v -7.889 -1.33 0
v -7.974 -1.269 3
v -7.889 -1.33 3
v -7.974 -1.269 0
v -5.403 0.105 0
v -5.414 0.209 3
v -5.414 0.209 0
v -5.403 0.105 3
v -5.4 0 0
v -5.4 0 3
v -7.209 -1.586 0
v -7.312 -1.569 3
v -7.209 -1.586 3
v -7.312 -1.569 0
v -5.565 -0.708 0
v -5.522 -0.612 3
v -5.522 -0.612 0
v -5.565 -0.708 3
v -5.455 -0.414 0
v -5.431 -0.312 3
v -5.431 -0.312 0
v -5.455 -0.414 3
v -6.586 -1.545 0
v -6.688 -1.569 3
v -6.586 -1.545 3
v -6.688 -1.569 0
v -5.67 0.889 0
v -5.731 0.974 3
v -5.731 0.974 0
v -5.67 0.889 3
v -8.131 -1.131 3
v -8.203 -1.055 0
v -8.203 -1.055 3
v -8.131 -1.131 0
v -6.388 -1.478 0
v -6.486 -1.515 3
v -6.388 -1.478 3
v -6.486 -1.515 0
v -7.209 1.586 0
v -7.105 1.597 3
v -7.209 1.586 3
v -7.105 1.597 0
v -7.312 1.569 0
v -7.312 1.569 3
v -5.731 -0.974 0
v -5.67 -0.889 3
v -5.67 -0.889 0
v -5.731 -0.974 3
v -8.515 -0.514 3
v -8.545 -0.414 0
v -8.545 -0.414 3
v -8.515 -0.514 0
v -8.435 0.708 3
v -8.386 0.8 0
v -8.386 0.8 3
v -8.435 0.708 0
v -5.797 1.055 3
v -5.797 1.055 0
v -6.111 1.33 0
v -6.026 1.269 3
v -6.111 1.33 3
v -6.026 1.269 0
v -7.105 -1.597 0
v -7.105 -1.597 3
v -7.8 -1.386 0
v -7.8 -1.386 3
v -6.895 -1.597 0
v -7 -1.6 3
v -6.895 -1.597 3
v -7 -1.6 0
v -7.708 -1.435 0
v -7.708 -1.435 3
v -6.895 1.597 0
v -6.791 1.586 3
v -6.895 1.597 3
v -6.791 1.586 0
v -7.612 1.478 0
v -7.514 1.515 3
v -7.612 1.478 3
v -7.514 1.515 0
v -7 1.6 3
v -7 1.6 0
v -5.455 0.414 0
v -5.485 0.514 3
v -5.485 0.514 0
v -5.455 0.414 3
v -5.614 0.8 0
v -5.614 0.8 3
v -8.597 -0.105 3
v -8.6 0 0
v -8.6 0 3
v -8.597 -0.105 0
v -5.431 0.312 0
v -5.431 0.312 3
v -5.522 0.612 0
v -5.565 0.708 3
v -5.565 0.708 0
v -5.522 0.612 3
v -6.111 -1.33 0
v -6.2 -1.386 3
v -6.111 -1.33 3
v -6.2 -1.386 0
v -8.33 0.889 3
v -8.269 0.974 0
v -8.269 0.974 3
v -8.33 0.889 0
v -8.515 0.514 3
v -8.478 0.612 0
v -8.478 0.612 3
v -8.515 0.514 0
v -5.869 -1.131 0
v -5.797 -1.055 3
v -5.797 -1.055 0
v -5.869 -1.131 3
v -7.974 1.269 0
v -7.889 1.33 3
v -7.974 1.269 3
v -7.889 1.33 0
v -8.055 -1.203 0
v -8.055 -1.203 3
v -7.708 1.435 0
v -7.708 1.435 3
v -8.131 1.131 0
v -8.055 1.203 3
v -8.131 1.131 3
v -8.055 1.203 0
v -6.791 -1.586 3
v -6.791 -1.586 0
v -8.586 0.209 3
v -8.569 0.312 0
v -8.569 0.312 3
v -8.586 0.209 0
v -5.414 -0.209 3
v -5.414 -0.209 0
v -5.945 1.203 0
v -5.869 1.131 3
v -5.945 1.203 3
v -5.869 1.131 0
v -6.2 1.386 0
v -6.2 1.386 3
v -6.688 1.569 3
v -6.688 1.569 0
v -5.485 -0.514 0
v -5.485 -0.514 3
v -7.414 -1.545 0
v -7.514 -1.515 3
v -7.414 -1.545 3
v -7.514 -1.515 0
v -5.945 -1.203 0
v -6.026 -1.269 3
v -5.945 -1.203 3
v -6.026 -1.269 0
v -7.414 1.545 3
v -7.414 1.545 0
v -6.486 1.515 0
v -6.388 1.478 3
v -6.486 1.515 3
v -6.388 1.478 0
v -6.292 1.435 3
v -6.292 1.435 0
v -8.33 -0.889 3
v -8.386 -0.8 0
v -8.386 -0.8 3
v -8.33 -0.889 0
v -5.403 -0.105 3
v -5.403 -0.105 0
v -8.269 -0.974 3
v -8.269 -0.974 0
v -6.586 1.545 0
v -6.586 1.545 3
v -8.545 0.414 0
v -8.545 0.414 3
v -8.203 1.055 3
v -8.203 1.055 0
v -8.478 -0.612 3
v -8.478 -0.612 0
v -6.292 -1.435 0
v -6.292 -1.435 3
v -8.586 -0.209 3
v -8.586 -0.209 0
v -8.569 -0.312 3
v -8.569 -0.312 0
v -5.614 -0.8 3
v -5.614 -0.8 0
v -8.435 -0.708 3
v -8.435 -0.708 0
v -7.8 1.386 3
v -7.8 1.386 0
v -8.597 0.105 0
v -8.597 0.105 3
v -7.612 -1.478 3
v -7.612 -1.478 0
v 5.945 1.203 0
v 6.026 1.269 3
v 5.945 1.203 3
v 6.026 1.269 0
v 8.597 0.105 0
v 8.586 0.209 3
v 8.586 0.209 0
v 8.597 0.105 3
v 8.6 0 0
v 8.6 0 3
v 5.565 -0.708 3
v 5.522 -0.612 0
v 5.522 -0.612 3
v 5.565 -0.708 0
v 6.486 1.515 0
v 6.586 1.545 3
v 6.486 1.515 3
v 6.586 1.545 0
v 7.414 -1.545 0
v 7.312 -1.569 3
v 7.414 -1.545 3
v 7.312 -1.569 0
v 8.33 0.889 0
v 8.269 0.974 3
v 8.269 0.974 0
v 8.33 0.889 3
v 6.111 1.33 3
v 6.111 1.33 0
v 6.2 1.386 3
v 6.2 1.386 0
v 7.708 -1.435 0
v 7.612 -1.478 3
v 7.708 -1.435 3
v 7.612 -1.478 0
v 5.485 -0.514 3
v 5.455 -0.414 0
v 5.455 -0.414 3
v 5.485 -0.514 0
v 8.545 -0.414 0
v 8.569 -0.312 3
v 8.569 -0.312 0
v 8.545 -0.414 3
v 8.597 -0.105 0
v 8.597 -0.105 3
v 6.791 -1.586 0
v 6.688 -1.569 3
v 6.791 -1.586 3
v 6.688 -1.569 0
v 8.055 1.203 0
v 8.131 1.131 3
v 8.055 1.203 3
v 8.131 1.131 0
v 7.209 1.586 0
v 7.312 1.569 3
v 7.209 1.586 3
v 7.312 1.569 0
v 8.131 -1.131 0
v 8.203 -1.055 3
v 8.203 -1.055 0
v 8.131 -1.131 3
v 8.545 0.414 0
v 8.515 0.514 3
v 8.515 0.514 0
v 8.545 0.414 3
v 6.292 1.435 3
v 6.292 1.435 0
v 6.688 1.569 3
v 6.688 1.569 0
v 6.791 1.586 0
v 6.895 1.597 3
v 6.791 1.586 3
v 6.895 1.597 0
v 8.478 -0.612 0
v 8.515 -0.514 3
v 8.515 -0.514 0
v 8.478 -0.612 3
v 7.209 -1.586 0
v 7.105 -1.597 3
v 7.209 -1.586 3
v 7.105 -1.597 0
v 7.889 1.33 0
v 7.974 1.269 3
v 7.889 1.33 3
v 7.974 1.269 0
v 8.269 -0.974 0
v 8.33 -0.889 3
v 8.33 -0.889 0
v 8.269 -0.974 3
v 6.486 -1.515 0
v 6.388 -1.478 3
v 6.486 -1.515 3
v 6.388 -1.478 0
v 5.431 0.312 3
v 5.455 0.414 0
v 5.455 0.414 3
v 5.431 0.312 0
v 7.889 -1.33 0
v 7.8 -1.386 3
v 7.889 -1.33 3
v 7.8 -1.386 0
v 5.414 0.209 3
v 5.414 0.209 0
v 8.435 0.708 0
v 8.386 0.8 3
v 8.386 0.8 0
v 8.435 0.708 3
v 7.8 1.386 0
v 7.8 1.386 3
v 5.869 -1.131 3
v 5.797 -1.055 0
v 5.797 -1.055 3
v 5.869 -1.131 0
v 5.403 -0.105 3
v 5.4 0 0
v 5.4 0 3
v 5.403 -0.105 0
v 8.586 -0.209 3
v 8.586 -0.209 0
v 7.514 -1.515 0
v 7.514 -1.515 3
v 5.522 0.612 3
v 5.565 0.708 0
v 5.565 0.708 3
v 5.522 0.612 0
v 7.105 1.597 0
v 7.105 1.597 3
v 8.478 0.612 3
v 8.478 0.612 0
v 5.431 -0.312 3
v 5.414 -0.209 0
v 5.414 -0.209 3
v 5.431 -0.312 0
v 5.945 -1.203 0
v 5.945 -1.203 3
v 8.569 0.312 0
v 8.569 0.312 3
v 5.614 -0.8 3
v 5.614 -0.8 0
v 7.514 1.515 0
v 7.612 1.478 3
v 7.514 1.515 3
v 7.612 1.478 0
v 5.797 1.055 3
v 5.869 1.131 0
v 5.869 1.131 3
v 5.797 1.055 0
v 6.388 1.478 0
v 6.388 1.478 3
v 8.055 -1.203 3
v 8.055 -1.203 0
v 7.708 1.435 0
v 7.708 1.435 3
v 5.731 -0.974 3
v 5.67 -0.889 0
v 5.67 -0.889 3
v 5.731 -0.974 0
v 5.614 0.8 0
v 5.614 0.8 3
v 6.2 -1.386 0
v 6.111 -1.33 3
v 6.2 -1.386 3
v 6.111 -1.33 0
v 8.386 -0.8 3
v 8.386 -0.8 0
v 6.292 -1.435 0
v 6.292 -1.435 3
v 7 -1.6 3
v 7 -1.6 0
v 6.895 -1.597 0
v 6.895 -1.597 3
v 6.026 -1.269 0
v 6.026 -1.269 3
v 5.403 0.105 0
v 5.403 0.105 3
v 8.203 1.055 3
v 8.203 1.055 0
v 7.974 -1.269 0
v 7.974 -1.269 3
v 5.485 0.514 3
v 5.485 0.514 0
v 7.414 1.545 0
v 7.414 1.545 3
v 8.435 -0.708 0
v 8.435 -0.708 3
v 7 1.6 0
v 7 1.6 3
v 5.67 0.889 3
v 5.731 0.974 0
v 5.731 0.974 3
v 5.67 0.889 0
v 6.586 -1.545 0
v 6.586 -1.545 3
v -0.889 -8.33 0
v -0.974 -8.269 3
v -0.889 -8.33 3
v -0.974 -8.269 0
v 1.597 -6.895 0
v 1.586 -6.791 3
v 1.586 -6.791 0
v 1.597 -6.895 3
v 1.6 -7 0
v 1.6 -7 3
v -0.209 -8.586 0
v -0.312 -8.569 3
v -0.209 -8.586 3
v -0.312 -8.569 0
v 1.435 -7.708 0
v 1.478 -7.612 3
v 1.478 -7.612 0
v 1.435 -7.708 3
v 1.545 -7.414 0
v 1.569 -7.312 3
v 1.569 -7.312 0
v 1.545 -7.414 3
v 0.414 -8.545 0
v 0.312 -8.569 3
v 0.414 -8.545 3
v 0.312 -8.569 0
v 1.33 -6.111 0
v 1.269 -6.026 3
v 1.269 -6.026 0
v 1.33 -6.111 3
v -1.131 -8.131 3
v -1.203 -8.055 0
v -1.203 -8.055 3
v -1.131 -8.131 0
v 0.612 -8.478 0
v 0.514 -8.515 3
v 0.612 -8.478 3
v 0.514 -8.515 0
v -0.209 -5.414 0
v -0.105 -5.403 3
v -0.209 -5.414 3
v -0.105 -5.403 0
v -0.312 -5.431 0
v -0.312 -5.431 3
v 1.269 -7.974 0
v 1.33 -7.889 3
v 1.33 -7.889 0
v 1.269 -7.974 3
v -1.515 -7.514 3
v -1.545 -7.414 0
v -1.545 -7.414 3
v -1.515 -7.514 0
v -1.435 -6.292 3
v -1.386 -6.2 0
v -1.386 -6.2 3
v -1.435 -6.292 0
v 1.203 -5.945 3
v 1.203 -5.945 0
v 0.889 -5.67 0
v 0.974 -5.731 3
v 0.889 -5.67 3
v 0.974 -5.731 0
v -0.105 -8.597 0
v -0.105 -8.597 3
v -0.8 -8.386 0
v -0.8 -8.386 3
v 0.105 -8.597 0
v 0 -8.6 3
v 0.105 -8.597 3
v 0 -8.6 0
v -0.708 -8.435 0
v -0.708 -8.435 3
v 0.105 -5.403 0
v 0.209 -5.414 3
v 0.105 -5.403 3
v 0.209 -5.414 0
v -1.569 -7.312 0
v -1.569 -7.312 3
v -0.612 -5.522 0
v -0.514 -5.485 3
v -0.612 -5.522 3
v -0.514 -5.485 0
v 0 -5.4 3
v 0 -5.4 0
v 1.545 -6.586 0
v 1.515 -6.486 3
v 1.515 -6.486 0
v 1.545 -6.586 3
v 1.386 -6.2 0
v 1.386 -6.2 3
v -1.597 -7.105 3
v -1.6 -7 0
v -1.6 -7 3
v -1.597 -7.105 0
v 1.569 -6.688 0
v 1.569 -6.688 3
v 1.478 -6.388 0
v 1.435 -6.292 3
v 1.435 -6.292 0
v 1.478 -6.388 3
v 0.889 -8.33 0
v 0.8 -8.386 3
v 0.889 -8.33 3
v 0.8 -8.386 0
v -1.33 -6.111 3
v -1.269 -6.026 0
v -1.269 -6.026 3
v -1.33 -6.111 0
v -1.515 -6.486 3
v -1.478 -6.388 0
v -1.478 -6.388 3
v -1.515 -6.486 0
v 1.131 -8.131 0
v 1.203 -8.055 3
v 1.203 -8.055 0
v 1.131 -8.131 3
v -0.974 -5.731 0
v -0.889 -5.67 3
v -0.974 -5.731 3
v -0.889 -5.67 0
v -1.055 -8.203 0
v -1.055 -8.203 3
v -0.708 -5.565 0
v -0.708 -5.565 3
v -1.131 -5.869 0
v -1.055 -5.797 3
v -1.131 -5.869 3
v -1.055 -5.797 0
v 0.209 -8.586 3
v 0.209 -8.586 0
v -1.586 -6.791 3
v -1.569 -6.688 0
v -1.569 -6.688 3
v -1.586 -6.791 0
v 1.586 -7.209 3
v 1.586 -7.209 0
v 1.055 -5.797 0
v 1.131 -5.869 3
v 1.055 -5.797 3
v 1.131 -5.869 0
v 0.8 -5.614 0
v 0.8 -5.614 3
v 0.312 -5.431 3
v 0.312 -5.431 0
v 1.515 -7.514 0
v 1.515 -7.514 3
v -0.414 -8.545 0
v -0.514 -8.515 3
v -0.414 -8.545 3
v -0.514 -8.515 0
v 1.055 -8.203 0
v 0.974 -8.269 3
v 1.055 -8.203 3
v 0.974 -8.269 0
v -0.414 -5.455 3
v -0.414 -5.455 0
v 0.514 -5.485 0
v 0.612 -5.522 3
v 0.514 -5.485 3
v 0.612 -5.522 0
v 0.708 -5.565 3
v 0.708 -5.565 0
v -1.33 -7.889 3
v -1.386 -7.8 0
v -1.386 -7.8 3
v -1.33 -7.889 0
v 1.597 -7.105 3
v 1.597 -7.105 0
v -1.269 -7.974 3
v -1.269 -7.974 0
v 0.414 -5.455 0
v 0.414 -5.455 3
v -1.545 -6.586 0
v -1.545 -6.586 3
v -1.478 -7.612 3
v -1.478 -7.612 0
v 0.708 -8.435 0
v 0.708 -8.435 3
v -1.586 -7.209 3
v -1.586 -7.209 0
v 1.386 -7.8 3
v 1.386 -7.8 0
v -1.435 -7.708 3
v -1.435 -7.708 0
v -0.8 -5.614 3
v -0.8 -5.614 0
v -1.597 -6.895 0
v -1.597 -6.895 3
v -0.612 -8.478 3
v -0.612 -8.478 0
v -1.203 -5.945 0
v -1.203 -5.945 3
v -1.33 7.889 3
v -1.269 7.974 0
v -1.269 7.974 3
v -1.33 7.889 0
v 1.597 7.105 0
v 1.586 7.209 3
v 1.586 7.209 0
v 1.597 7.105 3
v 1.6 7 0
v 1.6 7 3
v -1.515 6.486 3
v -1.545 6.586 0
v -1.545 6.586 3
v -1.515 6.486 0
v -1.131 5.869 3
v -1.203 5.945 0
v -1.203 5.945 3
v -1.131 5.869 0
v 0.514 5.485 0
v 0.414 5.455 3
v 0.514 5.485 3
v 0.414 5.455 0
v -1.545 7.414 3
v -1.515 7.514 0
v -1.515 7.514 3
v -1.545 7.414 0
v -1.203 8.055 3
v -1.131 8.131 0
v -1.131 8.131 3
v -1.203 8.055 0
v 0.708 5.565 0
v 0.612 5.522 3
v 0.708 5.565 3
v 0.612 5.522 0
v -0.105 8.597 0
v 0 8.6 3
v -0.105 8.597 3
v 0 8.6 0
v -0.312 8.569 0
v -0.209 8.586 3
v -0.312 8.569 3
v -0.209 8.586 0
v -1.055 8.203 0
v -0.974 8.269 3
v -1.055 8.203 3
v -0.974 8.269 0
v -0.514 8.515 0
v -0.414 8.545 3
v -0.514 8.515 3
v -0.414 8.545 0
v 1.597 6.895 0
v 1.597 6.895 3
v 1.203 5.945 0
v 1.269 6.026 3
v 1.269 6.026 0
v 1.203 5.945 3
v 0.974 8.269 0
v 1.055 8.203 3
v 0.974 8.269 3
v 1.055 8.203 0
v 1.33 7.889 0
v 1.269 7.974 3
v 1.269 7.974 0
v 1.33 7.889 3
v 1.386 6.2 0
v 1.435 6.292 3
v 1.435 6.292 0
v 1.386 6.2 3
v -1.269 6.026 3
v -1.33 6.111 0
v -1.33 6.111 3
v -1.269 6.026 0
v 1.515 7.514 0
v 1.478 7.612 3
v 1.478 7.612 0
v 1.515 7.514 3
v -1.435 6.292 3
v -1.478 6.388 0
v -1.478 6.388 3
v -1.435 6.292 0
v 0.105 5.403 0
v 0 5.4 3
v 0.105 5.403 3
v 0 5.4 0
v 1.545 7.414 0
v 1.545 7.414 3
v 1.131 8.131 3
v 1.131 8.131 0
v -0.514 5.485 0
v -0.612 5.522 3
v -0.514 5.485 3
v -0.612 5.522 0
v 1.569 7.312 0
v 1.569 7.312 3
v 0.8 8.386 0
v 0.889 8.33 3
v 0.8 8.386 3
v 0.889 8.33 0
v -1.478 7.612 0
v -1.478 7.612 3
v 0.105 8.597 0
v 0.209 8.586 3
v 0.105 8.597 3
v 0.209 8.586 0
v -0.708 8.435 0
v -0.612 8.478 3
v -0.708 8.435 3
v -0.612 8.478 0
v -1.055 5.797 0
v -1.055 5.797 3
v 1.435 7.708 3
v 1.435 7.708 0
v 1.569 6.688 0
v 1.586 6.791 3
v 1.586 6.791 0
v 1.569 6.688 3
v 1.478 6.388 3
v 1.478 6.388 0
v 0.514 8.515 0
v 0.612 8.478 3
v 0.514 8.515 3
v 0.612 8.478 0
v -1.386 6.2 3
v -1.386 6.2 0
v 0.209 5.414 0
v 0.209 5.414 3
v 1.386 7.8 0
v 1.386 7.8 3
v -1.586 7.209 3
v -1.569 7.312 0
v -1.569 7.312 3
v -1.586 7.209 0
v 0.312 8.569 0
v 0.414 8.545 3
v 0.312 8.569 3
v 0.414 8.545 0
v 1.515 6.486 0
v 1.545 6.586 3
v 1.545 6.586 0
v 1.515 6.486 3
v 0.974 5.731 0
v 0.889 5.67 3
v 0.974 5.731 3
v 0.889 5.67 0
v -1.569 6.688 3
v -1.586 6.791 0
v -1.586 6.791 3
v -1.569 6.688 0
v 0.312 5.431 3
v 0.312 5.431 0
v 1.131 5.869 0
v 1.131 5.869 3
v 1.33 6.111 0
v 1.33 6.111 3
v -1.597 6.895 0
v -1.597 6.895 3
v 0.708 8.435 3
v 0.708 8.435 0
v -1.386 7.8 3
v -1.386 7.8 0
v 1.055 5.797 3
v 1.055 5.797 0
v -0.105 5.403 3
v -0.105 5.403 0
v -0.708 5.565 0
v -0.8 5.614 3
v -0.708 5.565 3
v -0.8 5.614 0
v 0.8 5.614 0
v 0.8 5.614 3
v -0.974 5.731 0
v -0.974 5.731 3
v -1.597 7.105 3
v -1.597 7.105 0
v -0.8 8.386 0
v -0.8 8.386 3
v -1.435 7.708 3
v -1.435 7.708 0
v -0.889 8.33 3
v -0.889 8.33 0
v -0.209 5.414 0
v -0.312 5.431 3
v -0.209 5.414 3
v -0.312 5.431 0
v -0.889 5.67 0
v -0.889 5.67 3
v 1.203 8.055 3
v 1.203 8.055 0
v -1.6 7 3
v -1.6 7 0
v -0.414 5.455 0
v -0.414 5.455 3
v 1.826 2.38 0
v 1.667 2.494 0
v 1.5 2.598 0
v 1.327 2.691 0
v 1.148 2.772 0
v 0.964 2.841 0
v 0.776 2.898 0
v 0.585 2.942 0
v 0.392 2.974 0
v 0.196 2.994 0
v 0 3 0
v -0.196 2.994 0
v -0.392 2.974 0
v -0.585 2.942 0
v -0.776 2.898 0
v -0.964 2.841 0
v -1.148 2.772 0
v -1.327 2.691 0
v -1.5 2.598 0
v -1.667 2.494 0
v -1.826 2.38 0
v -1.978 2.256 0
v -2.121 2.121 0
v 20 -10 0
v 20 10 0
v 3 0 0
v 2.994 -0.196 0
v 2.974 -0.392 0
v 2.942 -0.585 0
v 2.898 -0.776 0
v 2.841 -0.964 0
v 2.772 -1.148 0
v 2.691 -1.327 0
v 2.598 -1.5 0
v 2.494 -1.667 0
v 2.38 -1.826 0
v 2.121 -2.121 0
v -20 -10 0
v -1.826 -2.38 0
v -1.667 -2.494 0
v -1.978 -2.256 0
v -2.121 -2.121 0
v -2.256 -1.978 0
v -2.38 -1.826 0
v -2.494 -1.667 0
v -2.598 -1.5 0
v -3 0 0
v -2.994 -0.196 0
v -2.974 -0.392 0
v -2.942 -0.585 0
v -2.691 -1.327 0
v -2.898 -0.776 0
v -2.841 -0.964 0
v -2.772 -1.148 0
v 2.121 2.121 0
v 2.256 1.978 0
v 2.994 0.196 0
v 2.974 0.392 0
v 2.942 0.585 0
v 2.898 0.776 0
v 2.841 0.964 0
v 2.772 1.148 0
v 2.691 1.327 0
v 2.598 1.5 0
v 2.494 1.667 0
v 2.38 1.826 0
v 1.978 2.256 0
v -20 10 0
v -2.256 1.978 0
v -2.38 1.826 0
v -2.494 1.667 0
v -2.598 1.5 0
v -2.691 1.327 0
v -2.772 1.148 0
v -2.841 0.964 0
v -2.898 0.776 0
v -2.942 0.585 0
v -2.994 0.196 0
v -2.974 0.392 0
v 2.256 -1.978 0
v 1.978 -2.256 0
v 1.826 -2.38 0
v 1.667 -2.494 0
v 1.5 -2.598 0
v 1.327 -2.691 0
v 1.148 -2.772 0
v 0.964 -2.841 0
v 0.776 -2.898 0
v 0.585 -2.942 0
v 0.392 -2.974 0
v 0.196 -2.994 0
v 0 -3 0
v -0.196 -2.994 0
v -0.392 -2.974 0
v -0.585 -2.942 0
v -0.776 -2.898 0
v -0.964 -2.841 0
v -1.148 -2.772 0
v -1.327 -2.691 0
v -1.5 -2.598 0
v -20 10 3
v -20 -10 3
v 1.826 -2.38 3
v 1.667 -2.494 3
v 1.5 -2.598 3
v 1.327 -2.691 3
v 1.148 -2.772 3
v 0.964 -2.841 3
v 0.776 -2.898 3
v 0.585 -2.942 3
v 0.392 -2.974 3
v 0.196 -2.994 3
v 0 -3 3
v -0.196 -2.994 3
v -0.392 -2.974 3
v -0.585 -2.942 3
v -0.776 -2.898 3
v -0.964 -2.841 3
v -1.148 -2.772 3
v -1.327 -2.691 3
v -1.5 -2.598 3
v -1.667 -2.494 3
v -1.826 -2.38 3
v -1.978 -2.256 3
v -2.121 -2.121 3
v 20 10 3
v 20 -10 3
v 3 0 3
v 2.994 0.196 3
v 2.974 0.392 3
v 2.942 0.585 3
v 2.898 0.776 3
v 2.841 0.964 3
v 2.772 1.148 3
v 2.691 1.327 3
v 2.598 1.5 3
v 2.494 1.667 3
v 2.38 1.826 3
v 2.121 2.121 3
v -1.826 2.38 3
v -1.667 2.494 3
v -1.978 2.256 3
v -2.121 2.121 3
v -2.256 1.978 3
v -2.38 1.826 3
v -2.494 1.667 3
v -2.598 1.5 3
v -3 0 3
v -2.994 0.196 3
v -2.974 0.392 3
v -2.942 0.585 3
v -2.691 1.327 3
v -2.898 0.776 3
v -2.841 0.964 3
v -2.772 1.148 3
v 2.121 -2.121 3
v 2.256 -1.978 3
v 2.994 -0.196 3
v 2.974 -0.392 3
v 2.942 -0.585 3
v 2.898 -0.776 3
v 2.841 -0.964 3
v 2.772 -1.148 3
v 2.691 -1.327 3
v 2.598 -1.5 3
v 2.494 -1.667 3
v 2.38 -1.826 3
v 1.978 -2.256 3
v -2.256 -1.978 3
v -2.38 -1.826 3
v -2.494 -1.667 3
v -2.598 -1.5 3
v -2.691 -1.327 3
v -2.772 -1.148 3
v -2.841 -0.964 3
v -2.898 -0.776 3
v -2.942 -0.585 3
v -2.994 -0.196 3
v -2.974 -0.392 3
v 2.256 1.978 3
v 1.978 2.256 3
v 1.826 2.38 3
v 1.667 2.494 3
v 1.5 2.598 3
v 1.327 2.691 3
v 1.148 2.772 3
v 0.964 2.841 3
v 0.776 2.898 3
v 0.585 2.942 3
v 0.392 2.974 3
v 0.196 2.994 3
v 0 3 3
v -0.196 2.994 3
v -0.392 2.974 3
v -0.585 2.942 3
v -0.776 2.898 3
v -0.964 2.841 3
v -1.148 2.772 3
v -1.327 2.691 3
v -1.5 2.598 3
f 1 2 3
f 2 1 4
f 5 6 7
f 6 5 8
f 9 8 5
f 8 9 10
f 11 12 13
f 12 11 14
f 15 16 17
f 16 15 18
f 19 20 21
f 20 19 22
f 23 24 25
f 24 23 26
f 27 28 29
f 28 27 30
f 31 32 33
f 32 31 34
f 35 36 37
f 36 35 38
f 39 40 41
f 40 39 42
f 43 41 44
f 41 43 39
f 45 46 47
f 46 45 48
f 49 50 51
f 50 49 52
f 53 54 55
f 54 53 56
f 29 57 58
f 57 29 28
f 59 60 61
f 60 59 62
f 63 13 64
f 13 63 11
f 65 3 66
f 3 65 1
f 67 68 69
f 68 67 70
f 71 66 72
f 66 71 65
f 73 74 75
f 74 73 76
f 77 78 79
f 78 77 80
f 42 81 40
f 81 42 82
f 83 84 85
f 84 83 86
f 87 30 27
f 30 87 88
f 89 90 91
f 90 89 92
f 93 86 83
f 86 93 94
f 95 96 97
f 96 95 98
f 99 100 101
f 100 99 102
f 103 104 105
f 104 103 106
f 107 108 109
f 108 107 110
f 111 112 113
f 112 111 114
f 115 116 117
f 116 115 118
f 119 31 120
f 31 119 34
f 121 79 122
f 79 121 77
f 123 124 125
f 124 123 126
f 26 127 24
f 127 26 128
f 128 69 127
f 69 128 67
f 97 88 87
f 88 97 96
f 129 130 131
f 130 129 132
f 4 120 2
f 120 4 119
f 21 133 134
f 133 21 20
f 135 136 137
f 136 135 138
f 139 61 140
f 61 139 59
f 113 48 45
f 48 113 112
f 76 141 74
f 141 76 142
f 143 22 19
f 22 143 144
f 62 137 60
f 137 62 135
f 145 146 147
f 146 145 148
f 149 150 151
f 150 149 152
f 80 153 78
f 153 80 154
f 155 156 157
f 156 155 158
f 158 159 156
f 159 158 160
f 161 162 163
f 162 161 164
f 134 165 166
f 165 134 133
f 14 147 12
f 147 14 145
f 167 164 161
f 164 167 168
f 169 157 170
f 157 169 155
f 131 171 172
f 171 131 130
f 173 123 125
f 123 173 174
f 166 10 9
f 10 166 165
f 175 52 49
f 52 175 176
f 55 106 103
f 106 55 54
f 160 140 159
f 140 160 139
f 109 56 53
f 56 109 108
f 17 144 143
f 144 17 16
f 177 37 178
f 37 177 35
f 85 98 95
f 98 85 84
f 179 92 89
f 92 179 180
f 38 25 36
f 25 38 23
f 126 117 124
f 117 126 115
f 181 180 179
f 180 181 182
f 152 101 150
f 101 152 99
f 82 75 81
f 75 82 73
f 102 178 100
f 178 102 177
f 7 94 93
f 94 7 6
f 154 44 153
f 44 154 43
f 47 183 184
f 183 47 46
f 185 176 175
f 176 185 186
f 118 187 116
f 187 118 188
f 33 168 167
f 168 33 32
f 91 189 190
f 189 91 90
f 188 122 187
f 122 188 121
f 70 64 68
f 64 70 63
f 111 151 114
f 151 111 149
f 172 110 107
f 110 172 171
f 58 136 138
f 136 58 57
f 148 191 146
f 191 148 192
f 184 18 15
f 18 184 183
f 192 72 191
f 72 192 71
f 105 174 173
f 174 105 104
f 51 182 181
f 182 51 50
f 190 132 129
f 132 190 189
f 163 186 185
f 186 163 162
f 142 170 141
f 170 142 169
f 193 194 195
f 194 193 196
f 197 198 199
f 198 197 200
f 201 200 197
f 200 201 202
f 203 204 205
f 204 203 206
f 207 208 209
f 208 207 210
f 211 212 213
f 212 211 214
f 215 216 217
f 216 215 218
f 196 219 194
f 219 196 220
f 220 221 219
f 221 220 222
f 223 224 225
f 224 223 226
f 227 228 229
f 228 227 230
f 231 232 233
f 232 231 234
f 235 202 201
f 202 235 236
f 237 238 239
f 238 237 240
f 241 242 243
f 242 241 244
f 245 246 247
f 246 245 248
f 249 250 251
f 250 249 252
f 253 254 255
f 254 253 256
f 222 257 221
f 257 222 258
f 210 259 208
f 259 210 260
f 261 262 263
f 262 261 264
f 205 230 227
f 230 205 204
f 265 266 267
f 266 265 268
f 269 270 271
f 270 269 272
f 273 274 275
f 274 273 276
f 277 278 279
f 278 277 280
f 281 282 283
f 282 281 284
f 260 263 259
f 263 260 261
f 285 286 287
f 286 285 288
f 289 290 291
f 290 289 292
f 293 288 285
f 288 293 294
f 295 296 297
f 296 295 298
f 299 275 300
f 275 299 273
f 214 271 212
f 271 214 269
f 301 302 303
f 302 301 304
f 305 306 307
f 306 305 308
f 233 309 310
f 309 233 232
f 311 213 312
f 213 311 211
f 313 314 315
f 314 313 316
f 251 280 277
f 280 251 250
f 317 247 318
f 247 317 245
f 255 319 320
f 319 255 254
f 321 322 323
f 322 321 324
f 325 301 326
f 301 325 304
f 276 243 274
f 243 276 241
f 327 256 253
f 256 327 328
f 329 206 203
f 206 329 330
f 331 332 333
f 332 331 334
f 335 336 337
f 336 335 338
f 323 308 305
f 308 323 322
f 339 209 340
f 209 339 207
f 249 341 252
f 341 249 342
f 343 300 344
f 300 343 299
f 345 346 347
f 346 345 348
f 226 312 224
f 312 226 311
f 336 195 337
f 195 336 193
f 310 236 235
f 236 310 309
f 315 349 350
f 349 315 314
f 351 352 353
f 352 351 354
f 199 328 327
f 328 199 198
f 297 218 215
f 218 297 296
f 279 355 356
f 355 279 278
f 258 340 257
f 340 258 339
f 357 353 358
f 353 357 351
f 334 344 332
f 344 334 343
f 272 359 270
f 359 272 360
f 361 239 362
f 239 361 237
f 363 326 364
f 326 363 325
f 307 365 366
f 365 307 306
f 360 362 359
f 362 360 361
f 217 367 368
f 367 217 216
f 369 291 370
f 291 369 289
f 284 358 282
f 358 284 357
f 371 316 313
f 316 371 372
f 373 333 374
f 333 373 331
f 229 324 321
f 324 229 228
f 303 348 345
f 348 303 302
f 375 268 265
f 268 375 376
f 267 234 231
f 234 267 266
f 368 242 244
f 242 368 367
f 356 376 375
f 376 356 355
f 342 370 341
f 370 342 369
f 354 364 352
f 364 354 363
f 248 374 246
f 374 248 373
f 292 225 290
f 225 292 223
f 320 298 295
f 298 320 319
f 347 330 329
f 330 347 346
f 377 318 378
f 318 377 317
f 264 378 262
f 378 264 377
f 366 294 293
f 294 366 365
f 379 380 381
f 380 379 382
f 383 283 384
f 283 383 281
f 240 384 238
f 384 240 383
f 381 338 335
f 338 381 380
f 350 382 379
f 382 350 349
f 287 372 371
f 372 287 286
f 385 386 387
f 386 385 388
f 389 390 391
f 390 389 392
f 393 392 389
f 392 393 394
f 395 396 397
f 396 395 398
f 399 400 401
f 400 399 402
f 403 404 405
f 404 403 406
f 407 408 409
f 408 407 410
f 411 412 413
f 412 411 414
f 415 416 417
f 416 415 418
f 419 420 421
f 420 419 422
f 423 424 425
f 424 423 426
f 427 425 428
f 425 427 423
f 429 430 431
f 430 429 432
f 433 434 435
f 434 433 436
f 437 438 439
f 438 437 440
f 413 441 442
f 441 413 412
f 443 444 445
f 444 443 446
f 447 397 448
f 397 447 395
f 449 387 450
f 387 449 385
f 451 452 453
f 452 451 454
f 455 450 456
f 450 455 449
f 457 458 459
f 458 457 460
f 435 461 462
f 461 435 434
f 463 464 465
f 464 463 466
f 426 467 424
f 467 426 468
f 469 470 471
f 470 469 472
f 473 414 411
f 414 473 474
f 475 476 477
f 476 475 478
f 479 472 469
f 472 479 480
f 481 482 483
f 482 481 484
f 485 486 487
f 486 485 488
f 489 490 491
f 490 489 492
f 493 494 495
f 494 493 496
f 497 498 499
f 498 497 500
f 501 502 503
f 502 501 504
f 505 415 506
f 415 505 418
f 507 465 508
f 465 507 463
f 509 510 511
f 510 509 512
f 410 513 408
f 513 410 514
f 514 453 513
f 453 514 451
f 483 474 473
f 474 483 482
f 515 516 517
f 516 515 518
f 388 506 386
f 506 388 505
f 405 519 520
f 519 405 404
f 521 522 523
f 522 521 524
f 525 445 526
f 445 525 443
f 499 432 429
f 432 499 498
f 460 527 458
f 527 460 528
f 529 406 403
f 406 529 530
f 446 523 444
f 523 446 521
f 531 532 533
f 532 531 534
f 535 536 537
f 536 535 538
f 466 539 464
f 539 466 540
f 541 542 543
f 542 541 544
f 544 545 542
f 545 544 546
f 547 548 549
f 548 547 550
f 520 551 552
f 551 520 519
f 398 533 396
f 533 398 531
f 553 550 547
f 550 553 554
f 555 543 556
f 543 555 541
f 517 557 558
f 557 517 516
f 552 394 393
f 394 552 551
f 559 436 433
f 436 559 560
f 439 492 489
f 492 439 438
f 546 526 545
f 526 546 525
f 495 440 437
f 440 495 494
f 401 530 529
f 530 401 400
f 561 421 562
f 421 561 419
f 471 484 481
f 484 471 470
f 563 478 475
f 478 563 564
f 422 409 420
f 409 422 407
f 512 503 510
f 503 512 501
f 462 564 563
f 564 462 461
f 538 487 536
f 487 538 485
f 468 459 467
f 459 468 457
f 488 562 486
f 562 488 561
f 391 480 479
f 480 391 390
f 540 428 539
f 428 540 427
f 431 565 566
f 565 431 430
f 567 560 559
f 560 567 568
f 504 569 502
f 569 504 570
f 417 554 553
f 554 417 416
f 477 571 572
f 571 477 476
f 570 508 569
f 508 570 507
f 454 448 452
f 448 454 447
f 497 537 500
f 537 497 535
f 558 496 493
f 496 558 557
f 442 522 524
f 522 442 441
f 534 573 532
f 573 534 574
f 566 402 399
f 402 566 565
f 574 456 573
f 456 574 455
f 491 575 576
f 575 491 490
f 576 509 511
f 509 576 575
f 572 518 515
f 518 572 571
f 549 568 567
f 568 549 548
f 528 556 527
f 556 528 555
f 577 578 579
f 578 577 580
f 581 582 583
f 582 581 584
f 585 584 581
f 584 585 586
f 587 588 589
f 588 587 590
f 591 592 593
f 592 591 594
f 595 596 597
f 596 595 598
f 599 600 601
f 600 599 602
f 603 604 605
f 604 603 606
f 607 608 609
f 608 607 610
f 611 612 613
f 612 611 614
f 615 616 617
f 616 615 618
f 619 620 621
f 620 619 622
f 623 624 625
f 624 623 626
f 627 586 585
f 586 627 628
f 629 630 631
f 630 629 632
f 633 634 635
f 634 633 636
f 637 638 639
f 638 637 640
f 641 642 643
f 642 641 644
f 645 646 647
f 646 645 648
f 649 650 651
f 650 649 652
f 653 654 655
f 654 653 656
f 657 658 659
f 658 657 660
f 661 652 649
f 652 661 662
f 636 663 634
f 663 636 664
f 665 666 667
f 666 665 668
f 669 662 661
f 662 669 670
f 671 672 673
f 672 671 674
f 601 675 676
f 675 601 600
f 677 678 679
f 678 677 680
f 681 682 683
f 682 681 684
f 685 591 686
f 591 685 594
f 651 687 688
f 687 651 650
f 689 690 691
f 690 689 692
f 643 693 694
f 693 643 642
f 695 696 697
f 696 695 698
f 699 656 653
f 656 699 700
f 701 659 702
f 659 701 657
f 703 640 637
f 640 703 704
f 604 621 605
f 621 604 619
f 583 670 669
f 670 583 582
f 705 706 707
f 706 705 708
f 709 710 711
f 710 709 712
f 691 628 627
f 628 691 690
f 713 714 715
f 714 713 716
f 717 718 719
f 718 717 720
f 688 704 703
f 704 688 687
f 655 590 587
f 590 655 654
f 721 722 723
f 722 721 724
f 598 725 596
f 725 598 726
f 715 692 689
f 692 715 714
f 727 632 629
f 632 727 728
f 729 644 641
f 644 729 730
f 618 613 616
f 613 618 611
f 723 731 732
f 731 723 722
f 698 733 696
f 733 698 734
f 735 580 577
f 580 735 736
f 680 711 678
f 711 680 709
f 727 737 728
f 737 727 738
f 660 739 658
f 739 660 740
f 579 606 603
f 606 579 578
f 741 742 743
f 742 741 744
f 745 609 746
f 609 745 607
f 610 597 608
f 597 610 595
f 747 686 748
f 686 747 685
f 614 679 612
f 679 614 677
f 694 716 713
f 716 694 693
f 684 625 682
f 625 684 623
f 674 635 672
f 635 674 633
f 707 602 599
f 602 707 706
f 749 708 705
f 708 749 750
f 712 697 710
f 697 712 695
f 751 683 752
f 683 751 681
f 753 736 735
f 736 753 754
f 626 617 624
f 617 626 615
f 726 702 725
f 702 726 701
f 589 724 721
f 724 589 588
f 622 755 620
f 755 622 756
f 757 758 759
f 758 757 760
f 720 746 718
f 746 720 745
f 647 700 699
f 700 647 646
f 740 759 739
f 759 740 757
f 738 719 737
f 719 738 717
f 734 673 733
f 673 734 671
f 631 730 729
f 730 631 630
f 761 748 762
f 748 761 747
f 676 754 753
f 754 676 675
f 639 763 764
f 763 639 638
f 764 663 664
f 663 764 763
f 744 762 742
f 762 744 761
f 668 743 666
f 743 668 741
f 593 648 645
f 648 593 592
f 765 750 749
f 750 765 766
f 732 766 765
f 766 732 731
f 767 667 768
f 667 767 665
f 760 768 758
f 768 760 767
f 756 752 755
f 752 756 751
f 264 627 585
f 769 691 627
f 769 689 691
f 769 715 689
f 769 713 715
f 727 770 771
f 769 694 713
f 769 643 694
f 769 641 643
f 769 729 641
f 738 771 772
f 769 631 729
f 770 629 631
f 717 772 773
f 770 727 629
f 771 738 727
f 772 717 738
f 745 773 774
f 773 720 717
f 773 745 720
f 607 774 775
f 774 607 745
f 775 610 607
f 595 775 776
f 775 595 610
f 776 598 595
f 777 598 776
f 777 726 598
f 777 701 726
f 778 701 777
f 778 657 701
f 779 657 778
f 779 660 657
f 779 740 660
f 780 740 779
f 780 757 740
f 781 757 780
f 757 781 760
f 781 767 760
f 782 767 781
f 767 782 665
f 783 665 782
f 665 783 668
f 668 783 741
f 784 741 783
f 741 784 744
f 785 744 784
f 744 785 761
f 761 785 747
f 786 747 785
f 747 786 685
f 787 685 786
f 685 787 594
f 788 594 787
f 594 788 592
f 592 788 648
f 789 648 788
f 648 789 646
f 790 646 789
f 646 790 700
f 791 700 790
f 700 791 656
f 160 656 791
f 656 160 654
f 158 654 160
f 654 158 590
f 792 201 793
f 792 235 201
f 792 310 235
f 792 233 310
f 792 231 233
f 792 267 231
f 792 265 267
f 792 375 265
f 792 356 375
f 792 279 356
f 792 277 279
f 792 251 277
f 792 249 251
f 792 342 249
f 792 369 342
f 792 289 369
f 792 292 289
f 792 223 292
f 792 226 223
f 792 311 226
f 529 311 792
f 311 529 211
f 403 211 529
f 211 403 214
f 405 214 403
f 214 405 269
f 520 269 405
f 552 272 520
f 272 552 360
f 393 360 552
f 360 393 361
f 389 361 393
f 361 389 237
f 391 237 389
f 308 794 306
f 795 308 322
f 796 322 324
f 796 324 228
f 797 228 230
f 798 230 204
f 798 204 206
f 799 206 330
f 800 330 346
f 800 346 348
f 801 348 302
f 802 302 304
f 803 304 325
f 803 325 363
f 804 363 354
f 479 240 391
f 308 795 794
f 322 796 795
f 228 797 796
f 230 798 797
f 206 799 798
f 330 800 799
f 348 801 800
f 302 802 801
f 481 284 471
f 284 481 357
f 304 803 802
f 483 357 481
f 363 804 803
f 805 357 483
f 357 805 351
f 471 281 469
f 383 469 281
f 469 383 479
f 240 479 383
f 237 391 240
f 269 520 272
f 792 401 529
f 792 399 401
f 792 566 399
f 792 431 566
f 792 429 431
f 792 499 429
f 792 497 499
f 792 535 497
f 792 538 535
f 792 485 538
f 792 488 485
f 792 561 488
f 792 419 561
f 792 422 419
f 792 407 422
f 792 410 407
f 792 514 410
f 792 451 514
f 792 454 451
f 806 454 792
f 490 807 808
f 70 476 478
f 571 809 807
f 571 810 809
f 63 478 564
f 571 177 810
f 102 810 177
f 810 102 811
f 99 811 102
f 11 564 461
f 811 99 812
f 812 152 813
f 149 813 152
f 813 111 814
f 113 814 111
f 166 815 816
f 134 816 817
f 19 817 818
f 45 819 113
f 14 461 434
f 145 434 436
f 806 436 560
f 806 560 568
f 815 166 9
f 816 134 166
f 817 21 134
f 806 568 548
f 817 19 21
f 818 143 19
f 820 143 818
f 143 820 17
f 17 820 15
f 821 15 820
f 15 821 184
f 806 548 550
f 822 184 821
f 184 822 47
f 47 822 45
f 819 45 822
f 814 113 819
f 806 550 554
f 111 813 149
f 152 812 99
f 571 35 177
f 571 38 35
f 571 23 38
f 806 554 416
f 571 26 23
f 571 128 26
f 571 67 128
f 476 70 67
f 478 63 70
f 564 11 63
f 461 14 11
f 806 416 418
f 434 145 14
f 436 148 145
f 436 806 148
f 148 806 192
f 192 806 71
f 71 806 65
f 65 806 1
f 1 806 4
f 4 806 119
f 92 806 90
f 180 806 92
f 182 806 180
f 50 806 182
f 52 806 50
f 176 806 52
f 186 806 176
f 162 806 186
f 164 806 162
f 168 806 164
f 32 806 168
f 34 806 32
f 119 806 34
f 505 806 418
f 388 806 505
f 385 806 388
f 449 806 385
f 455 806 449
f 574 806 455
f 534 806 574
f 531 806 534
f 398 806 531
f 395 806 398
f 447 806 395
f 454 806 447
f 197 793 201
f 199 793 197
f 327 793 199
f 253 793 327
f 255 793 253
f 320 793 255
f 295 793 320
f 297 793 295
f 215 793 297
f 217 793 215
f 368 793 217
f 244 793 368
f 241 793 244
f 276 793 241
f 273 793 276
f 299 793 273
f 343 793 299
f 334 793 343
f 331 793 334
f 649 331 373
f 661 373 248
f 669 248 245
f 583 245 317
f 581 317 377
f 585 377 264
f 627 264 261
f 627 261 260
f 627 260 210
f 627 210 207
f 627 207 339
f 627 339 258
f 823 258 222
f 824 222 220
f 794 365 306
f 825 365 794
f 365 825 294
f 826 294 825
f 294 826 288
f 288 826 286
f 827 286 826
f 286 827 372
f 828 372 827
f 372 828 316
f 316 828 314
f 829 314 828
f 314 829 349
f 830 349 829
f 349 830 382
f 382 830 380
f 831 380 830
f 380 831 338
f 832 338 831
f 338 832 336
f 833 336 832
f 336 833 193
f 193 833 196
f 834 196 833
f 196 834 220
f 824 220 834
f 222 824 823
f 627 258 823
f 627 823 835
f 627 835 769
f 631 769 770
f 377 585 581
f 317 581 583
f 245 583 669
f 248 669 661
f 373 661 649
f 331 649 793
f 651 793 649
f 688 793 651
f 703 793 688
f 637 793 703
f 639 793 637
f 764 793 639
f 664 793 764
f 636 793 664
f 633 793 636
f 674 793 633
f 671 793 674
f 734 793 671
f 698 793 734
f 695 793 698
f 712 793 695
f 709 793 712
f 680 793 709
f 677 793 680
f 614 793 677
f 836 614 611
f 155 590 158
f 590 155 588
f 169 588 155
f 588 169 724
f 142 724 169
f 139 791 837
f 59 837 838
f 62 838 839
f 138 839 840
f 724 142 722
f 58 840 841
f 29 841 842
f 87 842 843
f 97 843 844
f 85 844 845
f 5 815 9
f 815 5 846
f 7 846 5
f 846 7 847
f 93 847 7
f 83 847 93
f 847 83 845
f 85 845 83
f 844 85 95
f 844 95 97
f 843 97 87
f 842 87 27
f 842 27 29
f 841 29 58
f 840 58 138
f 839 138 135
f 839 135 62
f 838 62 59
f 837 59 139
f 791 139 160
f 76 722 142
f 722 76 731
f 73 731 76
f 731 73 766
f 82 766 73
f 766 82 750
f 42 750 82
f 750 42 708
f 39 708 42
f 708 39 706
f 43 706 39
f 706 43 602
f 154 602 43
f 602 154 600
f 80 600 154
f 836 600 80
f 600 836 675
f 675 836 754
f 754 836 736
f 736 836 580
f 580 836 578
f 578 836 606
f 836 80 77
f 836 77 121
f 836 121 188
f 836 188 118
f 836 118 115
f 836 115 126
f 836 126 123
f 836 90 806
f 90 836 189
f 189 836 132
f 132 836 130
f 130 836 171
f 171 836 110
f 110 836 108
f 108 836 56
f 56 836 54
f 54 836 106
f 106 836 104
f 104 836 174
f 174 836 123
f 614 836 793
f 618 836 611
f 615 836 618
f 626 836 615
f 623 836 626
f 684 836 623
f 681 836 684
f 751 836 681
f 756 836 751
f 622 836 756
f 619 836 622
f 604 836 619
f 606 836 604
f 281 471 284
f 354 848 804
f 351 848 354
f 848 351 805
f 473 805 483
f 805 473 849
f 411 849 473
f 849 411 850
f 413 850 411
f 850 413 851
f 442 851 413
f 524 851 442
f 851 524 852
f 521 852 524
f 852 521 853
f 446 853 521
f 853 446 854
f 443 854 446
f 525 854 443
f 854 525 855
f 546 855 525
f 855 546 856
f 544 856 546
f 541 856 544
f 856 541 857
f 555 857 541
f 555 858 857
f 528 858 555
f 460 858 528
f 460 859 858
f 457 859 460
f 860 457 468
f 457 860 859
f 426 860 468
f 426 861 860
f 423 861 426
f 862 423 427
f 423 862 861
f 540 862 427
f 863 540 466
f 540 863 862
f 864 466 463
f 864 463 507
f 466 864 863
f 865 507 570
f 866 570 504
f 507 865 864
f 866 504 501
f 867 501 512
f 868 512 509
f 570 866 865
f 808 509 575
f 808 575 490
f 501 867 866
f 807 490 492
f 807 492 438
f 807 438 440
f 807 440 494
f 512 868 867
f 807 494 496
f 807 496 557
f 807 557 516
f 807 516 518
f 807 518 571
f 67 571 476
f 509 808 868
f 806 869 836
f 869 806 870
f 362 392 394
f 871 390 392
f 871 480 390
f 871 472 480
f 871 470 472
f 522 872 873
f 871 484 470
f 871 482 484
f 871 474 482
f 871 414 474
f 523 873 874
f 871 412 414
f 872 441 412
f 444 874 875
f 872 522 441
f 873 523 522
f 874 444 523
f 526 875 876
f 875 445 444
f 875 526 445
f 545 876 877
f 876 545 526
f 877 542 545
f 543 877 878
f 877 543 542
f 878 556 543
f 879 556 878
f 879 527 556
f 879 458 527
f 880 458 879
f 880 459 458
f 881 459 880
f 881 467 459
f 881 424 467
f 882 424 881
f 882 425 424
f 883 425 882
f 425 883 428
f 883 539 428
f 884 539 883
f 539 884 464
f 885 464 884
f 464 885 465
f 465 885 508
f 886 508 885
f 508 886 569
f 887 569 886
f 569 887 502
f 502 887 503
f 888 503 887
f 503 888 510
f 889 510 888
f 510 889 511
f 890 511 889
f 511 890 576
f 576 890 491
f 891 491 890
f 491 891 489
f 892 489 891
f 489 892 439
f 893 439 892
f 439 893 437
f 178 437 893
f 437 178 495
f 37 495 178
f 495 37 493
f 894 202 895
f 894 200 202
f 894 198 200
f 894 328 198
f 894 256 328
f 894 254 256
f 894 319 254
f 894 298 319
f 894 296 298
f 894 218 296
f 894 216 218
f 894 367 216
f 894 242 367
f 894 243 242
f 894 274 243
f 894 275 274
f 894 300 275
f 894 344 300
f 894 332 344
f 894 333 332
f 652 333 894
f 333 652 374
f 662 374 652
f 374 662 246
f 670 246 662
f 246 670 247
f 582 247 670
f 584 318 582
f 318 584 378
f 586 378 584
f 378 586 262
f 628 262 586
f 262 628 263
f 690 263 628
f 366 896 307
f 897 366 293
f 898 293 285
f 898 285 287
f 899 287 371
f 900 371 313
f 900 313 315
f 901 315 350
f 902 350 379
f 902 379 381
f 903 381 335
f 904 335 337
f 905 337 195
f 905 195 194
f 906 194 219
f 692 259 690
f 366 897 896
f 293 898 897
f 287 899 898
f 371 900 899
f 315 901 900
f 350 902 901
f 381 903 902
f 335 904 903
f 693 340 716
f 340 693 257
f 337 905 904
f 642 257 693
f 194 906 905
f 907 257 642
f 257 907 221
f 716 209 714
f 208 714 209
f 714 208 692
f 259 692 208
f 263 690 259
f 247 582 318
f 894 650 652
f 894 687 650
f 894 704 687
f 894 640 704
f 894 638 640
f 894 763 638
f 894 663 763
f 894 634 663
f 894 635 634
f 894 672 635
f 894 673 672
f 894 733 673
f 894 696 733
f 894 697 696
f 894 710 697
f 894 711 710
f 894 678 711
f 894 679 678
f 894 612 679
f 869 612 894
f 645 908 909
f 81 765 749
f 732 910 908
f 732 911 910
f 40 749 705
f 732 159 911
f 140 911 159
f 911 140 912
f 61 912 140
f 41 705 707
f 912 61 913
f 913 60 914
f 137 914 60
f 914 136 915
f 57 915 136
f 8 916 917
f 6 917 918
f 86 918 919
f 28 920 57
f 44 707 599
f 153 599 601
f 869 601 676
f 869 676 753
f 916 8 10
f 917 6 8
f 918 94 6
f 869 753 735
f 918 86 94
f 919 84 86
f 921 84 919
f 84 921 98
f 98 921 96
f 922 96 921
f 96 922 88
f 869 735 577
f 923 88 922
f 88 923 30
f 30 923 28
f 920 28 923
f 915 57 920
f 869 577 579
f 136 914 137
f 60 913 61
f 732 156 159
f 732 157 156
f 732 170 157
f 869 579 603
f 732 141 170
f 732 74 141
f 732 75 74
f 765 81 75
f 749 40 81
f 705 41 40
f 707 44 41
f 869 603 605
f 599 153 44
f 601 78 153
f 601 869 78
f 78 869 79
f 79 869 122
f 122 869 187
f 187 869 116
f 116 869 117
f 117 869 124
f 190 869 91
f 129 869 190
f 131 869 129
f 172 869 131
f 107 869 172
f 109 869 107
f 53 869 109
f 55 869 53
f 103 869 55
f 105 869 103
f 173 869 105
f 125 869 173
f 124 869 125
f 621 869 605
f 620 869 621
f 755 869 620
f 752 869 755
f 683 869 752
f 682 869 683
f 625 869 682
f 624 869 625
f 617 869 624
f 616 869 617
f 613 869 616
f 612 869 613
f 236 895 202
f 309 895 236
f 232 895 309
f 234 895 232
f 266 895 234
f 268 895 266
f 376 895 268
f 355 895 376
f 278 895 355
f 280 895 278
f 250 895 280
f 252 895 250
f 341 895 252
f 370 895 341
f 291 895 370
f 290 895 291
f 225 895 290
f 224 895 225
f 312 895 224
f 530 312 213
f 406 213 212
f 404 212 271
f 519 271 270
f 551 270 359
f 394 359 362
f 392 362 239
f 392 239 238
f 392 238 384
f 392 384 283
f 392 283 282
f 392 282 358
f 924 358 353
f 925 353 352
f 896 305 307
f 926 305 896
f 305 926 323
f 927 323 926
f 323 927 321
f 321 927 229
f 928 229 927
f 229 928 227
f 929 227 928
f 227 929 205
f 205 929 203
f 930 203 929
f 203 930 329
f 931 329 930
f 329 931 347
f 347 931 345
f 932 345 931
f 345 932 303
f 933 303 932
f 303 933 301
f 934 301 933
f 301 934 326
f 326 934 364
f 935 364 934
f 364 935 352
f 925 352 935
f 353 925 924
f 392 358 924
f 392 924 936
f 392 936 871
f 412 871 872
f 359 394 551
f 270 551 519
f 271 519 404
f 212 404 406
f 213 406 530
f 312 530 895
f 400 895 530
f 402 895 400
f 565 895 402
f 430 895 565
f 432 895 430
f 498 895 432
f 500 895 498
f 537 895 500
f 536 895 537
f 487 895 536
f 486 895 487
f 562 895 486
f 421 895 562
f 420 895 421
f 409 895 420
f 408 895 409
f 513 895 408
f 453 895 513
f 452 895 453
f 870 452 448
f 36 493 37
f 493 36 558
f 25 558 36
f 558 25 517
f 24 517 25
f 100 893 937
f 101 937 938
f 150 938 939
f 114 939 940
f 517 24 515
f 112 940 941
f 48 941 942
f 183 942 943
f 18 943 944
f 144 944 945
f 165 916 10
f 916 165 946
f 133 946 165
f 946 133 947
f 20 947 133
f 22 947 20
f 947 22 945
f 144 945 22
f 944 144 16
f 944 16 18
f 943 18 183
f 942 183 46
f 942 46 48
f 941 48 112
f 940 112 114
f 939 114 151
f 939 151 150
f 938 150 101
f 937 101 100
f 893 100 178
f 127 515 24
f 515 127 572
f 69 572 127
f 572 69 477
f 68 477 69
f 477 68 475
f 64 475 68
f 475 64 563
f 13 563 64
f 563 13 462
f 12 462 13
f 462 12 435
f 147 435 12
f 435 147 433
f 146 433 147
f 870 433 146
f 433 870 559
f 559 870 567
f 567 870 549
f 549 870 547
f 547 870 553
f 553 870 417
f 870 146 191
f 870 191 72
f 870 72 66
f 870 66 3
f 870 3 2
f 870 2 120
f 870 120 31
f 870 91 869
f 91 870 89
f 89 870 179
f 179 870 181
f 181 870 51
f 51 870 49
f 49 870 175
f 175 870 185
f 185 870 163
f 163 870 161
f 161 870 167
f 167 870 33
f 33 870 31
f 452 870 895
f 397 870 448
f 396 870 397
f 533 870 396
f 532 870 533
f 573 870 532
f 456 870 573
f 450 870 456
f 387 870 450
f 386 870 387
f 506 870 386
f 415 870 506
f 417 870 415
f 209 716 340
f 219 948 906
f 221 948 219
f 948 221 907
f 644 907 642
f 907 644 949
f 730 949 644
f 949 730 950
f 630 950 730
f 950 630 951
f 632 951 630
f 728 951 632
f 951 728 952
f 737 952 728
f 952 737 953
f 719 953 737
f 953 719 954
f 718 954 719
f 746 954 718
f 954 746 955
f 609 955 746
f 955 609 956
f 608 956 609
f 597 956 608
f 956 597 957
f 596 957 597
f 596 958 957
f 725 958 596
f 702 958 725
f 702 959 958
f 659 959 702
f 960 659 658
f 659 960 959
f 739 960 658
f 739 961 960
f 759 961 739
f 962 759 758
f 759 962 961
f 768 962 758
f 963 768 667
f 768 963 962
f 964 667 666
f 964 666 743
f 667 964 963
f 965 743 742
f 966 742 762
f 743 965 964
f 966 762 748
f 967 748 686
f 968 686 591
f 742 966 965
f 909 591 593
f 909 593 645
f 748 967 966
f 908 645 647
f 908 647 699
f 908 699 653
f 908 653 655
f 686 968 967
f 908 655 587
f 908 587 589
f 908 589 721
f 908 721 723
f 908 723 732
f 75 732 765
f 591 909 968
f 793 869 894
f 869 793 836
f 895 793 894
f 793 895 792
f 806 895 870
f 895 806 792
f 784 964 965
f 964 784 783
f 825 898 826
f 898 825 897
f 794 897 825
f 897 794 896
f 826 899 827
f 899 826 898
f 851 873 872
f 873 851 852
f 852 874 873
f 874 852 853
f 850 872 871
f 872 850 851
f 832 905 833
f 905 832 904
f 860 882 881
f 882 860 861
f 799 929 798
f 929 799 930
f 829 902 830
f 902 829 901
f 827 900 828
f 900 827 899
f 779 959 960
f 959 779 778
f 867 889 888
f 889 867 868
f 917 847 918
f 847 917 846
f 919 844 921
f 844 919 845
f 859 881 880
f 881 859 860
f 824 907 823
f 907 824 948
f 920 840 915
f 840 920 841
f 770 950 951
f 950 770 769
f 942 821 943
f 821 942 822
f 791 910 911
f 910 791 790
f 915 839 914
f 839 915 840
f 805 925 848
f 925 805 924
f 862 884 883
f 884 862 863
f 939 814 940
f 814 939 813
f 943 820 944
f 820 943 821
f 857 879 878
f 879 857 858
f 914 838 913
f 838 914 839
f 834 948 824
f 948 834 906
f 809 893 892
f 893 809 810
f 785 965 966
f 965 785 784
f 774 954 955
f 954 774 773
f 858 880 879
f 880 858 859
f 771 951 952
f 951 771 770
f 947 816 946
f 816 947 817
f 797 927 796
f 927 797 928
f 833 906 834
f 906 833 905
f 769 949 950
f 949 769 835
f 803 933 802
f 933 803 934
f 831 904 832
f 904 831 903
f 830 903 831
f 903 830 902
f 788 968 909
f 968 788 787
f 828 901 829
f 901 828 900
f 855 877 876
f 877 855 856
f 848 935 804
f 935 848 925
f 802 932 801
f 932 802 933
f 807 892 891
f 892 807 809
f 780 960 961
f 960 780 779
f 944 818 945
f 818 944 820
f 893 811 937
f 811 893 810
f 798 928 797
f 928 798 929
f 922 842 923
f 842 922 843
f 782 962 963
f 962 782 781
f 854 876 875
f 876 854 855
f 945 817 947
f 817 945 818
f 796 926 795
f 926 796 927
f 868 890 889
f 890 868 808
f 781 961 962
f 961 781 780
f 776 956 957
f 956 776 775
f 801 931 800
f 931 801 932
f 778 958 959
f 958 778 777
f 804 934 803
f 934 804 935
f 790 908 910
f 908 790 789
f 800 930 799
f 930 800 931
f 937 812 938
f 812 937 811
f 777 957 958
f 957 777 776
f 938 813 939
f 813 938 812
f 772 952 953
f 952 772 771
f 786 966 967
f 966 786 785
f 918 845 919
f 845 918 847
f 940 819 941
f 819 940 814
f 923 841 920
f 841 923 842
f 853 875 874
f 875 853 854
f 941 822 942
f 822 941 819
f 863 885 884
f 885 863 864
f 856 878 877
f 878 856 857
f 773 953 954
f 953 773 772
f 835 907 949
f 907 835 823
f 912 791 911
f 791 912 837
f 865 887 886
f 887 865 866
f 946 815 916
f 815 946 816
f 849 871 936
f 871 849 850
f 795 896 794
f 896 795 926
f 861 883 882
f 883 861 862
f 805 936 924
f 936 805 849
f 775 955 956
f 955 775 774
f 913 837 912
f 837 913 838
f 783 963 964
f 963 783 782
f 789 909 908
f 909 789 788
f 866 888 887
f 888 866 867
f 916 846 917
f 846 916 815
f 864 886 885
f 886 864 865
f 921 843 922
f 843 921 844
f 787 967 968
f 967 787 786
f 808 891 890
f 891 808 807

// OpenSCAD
// B2 bracket interface (visual approval model)
//
// Geometry described by user:
// - Outer interface rectangle: 40mm x 20mm
// - Center hole: Ø6mm at (0,0)
// - 4x M3 holes on lines of symmetry, spaced 7mm from center:
//   (±7, 0) and (0, ±7)
//
// Coordinate system:
// - Origin at plate center
// - X = long axis (40mm)
// - Y = short axis (20mm)

// ----------------------------
// Parameters
// ----------------------------
plate_x = 40;            // mm
plate_y = 20;            // mm
plate_thickness = 3;     // mm (visualization thickness)

center_hole_d = 6;       // mm
m3_hole_d = 3.2;         // mm (clearance)

hole_offset = 7;         // mm from center along symmetry axes

$fn = 96;

module hole(d, h) {
    cylinder(d=d, h=h, center=true);
}

module plate() {
    linear_extrude(height=plate_thickness)
        square([plate_x, plate_y], center=true);
}

difference() {
    plate();

    h = plate_thickness + 2;

    // Center hole
    translate([0, 0, plate_thickness/2])
        hole(center_hole_d, h);

    // 4x M3 holes at (±7,0), (0,±7)
    for (sx = [-1, 1])
        translate([sx*hole_offset, 0, plate_thickness/2])
            hole(m3_hole_d, h);

    for (sy = [-1, 1])
        translate([0, sy*hole_offset, plate_thickness/2])
            hole(m3_hole_d, h);
}
